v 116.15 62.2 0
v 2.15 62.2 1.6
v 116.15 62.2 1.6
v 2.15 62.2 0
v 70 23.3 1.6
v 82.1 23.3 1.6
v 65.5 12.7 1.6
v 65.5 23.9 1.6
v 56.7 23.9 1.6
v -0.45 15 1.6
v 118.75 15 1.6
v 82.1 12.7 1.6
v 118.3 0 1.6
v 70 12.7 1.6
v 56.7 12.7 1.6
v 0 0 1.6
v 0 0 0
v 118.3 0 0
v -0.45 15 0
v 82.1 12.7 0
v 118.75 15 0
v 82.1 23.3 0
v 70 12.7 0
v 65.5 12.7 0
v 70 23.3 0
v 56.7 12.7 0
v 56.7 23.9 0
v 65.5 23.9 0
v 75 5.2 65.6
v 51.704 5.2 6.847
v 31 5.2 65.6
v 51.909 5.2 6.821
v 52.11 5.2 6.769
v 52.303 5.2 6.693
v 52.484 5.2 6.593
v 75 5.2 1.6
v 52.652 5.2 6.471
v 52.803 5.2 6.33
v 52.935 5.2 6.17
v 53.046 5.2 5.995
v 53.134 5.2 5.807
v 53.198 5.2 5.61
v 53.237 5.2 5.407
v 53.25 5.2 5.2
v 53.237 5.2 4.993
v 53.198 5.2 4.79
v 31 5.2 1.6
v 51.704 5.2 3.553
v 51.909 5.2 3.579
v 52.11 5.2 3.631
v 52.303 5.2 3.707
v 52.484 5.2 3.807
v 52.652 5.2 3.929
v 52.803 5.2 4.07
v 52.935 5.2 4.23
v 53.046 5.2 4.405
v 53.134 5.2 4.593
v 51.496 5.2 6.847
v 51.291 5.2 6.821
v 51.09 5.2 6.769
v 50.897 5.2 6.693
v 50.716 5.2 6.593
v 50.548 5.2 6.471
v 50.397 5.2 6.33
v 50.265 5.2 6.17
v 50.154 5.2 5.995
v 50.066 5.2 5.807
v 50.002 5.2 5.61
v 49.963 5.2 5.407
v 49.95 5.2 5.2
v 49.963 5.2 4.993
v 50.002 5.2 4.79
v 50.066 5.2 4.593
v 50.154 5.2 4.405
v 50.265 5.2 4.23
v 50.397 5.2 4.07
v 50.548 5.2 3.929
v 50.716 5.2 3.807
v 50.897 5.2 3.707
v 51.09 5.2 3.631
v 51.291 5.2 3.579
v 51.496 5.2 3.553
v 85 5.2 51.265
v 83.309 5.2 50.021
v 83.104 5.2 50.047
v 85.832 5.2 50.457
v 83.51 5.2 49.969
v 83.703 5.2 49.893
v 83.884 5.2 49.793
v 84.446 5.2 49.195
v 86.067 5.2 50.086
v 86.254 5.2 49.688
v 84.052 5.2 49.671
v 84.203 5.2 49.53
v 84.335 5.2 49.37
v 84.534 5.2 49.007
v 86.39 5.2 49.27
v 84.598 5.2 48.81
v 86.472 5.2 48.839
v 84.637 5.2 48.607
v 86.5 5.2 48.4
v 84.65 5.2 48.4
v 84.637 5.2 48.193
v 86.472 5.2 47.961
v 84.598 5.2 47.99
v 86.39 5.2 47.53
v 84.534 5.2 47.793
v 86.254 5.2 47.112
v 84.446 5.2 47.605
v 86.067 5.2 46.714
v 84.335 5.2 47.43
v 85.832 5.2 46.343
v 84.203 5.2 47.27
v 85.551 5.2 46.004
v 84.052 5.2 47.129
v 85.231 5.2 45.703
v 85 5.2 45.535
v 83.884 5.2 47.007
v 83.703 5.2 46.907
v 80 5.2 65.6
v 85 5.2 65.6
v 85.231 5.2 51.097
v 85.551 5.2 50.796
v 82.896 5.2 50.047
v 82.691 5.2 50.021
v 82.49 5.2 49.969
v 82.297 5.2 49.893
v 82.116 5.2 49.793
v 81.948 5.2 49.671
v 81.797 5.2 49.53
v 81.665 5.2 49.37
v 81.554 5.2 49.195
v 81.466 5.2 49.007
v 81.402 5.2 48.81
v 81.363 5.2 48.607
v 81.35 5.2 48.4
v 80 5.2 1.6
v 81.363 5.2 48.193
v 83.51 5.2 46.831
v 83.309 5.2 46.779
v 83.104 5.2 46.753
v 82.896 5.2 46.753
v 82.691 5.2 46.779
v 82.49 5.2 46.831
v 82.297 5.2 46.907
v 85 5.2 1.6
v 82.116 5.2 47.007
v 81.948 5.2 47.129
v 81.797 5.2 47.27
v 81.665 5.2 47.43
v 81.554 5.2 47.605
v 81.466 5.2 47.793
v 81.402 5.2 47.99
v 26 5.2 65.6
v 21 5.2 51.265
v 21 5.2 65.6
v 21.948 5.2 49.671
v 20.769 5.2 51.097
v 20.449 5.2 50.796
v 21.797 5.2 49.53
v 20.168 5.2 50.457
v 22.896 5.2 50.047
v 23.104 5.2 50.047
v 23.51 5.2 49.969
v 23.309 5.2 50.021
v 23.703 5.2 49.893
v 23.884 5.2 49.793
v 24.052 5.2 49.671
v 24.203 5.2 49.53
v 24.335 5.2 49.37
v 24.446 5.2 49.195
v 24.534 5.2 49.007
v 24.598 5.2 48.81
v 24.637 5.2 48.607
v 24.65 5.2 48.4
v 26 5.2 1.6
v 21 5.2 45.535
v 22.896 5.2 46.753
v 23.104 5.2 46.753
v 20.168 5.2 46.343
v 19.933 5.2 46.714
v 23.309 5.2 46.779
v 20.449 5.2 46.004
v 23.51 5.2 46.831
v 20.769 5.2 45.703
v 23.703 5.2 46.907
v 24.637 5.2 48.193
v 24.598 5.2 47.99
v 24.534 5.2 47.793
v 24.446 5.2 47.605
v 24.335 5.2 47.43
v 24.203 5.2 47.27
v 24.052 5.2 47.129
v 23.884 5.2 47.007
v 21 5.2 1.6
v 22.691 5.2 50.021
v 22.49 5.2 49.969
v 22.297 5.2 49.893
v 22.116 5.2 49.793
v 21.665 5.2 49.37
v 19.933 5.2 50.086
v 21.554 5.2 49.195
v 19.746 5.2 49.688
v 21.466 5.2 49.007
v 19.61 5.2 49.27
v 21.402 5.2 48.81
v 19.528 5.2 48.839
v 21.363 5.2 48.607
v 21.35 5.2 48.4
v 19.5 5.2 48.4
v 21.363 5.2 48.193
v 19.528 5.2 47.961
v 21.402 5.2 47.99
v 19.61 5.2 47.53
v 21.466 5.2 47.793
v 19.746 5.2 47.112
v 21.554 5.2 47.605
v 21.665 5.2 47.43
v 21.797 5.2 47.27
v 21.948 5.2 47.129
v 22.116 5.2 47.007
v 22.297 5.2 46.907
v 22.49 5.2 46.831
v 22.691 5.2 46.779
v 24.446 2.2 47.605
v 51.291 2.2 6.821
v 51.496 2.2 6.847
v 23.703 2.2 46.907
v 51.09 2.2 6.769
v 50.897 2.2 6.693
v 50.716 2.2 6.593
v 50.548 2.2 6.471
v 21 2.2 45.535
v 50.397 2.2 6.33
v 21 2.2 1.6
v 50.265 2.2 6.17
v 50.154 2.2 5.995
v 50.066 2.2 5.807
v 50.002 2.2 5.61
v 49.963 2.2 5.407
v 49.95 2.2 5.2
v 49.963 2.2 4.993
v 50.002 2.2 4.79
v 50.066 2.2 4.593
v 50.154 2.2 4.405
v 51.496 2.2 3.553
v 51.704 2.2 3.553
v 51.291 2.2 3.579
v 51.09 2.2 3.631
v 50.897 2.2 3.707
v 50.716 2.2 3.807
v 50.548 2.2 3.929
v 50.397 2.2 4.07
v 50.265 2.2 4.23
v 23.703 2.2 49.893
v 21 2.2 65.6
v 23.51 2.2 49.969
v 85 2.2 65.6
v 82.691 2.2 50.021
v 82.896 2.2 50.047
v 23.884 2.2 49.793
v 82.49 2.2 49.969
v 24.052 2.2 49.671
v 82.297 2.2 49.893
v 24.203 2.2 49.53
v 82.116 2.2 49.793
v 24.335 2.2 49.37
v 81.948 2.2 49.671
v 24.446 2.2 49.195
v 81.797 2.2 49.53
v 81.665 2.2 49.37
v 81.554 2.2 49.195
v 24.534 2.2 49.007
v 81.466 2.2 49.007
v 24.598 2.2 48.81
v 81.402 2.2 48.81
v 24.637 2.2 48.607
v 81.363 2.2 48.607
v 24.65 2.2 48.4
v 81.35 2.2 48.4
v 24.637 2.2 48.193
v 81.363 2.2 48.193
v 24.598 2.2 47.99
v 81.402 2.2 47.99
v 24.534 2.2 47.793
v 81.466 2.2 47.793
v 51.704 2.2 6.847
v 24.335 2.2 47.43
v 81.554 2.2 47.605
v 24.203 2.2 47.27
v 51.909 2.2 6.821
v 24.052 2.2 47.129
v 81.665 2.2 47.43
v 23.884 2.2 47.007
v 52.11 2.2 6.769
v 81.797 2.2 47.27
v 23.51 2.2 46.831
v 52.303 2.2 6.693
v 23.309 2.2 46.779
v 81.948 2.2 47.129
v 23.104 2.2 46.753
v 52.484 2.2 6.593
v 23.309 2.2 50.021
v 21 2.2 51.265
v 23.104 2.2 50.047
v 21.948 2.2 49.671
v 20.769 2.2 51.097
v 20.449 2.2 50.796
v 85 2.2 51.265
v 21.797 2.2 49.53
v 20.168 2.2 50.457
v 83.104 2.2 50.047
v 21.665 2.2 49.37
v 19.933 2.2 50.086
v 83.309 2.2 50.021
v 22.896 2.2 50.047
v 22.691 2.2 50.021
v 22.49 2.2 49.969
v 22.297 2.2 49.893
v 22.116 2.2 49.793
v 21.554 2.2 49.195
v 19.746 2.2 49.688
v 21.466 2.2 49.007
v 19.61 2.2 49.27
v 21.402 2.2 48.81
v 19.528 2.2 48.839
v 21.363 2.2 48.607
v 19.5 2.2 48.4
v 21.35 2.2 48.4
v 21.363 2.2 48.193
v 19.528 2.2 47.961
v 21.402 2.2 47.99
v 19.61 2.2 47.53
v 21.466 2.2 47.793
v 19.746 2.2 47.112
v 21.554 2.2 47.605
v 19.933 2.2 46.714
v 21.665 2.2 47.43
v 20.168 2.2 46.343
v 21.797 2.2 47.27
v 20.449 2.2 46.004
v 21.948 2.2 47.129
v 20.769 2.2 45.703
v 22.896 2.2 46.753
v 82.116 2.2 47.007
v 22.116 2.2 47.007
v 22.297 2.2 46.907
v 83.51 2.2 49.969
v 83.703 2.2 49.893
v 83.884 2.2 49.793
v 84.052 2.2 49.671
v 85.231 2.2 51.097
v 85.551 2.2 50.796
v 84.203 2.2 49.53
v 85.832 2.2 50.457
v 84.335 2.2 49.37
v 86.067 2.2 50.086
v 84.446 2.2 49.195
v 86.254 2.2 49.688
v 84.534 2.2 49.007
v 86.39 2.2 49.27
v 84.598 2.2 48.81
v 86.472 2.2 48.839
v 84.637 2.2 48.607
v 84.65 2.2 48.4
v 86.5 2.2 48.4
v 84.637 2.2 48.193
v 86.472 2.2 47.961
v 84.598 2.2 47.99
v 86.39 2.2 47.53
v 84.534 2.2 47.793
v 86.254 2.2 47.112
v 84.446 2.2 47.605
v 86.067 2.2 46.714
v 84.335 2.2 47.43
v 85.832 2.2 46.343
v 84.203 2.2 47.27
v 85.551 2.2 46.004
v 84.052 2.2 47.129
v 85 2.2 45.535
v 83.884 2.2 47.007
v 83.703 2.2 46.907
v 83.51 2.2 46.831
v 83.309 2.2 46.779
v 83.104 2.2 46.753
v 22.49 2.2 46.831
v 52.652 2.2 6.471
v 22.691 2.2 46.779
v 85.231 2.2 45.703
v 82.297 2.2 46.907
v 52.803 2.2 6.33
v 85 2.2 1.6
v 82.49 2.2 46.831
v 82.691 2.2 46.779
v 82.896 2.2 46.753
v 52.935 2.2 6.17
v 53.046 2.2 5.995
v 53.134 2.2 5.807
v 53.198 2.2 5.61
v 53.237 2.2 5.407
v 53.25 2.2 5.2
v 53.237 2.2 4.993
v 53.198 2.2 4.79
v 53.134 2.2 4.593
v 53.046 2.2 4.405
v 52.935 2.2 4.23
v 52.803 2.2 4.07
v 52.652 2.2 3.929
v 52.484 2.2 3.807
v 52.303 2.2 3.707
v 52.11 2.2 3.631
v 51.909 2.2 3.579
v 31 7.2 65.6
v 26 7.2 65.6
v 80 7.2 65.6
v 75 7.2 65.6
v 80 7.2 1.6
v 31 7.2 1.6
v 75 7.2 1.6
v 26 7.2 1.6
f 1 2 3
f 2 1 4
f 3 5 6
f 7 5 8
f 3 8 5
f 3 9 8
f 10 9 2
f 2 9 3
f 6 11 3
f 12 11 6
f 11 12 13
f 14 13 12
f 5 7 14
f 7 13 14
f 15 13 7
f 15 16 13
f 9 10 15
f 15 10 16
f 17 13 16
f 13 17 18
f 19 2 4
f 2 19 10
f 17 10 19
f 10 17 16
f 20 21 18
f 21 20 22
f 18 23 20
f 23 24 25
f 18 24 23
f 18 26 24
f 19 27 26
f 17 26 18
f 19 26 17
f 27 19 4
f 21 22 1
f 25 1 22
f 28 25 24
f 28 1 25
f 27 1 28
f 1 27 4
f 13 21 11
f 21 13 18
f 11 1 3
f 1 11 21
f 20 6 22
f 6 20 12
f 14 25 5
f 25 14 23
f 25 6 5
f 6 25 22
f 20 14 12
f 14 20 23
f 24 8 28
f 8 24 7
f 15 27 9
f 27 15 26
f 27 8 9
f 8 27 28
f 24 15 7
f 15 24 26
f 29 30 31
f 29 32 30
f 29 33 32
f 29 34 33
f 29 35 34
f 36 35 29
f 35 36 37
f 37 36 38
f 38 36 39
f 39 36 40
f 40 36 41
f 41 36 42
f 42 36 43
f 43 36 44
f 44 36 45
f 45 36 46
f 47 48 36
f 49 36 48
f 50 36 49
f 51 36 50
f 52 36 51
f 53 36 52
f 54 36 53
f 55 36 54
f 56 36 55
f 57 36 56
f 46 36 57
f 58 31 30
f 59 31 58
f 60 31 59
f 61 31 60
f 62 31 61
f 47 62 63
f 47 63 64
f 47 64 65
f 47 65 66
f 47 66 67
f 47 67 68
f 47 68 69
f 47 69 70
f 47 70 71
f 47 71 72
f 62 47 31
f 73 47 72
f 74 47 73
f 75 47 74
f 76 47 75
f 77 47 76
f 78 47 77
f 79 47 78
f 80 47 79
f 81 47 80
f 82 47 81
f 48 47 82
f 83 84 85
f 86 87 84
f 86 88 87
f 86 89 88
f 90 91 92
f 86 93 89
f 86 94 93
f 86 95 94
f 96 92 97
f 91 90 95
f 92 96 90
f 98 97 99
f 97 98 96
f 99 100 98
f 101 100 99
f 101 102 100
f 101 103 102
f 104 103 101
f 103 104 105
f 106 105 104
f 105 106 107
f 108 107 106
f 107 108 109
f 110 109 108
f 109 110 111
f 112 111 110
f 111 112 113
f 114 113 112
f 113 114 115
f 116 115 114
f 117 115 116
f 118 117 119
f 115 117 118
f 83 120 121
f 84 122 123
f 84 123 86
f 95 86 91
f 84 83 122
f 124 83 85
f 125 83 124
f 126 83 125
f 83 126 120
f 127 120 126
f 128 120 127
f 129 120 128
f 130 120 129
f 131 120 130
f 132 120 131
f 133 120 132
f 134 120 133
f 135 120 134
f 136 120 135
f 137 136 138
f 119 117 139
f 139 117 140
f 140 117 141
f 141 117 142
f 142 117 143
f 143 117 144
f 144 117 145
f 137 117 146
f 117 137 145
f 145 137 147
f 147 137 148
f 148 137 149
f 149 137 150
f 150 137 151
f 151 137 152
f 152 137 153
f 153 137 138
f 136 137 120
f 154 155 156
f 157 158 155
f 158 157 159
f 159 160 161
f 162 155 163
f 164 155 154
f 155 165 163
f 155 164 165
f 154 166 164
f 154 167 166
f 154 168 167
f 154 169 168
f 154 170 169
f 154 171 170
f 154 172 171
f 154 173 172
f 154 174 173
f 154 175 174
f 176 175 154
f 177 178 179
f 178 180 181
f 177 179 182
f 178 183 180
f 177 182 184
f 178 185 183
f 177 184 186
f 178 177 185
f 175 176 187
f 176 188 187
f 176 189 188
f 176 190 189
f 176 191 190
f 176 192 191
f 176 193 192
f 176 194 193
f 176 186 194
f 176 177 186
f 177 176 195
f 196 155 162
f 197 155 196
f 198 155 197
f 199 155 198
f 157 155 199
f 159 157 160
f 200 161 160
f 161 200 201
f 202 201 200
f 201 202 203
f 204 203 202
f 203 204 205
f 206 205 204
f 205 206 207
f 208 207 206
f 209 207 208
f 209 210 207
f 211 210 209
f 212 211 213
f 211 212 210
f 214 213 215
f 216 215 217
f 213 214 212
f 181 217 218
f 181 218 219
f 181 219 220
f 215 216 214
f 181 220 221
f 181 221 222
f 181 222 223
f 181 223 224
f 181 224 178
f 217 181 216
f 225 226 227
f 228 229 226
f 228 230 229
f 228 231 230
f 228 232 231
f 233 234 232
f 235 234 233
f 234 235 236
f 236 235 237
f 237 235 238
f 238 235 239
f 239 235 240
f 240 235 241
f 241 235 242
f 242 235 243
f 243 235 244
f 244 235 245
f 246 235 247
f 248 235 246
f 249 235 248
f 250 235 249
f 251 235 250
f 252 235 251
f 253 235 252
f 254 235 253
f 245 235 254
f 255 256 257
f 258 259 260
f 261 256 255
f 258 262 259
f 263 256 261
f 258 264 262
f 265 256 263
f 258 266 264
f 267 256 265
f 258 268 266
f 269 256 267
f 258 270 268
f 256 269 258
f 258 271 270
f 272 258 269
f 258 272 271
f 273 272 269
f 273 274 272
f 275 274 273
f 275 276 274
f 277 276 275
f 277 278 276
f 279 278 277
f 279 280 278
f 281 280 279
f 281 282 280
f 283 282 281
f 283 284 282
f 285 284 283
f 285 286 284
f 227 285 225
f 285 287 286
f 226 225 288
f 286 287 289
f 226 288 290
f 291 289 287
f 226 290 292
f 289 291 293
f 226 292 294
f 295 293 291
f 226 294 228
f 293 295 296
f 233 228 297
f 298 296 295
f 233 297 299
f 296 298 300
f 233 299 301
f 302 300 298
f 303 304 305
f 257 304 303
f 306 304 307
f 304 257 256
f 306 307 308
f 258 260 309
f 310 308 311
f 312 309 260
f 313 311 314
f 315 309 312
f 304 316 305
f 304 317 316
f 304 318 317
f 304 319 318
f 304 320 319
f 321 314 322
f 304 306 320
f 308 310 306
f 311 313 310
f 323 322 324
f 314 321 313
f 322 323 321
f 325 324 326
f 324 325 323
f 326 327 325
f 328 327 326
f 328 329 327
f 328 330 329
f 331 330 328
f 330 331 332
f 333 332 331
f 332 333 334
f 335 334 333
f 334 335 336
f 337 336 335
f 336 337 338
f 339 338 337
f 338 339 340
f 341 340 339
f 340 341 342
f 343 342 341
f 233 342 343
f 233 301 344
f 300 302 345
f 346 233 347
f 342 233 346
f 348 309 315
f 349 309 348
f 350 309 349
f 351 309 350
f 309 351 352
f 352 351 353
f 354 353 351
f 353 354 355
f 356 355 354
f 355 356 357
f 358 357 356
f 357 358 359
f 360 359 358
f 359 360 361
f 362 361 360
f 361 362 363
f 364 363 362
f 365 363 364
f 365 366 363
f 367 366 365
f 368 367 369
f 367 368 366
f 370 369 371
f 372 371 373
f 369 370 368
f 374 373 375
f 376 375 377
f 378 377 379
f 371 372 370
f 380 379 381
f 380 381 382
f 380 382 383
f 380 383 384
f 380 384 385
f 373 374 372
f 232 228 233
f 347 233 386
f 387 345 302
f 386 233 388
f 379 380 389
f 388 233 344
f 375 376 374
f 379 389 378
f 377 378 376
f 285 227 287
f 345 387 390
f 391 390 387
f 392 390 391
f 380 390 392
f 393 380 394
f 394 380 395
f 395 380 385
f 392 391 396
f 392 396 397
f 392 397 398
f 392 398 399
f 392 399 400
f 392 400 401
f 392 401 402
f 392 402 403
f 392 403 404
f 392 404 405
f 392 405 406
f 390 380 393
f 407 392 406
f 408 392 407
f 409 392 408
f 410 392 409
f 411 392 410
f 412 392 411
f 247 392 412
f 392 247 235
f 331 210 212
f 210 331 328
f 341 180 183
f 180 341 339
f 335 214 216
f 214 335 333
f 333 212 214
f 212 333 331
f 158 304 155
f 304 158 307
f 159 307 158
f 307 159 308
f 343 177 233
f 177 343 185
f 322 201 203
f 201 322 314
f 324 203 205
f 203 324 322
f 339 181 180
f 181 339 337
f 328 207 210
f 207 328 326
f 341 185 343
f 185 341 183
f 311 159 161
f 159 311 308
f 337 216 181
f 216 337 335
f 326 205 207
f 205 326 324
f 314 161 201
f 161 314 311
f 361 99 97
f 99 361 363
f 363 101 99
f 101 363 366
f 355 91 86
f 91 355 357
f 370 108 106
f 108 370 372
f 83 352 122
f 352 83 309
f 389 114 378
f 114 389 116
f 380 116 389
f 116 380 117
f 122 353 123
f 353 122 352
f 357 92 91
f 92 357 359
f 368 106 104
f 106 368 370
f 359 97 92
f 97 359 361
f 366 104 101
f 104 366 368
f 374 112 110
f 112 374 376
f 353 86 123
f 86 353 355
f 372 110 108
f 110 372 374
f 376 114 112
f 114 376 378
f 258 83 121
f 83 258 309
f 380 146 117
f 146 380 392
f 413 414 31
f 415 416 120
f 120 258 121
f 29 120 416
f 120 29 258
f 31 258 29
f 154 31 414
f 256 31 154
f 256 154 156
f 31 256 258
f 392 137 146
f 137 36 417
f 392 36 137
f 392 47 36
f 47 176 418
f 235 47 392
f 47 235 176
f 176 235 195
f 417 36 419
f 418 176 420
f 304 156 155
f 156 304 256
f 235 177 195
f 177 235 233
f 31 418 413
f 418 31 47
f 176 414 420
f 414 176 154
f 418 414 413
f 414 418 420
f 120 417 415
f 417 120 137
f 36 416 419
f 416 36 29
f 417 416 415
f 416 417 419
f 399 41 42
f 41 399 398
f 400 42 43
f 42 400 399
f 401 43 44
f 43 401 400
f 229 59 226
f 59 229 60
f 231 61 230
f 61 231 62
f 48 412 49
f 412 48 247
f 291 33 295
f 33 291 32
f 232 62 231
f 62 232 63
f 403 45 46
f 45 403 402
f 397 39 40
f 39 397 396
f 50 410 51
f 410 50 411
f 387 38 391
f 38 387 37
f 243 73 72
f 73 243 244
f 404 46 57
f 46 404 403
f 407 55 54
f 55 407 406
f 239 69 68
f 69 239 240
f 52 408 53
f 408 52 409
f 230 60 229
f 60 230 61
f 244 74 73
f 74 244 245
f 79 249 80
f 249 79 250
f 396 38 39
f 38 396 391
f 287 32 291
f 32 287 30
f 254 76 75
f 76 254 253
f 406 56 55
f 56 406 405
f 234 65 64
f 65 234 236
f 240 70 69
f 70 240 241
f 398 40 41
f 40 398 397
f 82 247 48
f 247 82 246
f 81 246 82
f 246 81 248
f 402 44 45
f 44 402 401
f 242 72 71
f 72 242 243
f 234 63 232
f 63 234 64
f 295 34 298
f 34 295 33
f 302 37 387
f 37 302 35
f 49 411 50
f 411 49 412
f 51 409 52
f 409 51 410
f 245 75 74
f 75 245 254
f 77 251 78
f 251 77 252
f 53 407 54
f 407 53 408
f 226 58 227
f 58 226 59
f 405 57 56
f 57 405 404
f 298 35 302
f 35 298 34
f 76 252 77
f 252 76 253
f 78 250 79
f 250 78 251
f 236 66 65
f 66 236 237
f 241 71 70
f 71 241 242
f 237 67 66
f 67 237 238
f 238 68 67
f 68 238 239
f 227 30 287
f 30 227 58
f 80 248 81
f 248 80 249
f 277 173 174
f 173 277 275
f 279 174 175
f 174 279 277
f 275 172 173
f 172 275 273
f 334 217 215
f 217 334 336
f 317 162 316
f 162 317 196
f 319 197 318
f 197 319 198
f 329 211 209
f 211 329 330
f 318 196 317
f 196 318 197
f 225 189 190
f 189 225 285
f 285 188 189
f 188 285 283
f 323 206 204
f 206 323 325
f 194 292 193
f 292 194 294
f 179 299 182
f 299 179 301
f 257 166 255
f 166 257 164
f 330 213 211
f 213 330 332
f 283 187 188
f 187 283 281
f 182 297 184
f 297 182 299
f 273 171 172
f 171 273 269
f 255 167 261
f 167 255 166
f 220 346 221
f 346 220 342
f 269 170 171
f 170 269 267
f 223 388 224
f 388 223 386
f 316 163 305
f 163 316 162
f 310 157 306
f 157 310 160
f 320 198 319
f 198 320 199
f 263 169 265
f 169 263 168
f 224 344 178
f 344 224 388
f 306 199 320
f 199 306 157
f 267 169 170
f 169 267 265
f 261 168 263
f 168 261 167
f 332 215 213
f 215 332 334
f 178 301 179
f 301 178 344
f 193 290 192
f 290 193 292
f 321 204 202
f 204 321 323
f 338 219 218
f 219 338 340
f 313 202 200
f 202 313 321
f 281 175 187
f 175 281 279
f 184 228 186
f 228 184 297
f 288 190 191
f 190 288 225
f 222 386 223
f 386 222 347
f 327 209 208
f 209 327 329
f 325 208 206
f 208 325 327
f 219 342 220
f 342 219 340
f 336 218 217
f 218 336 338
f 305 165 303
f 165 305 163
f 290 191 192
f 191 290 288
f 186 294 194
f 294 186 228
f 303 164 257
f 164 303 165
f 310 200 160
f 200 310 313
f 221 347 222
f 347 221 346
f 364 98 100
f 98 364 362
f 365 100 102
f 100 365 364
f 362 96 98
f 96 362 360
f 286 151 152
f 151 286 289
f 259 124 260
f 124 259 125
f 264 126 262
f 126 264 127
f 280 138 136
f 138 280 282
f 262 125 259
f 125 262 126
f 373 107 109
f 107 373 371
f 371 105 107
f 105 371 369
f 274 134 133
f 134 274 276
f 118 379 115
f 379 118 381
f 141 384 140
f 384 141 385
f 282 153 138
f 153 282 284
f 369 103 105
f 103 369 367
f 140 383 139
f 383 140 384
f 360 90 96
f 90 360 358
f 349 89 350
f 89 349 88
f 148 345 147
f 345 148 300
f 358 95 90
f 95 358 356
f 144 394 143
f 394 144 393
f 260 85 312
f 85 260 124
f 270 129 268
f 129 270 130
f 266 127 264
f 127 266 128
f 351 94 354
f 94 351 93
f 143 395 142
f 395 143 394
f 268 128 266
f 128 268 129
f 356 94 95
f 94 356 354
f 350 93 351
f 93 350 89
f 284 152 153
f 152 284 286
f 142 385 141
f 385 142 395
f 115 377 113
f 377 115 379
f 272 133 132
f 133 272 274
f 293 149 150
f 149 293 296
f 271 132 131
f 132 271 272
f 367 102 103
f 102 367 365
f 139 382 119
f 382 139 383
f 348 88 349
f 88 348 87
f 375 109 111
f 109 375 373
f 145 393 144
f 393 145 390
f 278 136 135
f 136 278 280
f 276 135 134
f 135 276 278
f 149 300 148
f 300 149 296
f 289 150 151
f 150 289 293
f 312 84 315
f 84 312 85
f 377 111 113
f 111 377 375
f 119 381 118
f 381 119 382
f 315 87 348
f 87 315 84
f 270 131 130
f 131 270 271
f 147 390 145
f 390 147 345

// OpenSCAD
//
// OpenSCAD file describing a back plate replacement for 3" Oric Microdisc drive units, includes:
// - PCB holder with three holes designed to host a GreaseWeazle F7 Lightning Plus
// - Holes on the back plate, one for the USB connector and one for the 12v power
//
thickness = 1.6;        // Total thickness of the back plate (mm)
height = 62.2;          // Height of the back plate (mm)
bottom_width = 118.3;   // Width at the bottom (mm)
mid_width = 119.2;      // Width at 15mm height (mm)
top_width = 114;        // Width at the top (mm)
mid_height = 15.0;      // Height of the widest section (mm)

// PCB support frame parameters
frame_offset_y = 2.2;   // Distance from bottom of back plate (mm)
frame_offset_x = 21.0;  // Distance from left side (mm)
frame_width = 64.0;     // Width of the frame along back plate (mm)
frame_depth = 64.0;     // Depth perpendicular to back plate (mm)
frame_thickness = 3.0;  // Thickness of the frame (mm)
ridge_thickness = 2.0;  // Thickness of the ridges on top
ridge_width = 5.0;      // Width of each ridge
ridge_offset_x = 5.0;   // Offset from frame edges for ridge placement
standoff_height = 6.0;  // Height of motherboard screw stands
pcb_thickness = 1.5;    // Thickness of the PCB

// Hole parameters
hole_radius = 3.3 / 2;        // Radius of holes (3.3mm diameter)
bulge_radius = 3.5;           // Radius for bulges (7 mm diameter)
hole1_x = 30.6;               // Center of first hole (30.6 mm from frame's left edge)
hole1_z = thickness + 2.0;    // 2 mm from front edge (back plate inner surface)
hole2_x = 2.0;                // 2 mm from left edge of frame
hole2_z = thickness + 45.2;   // 45.2 mm from front panel
hole3_x = frame_width - 2.0;  // 2 mm from right edge of frame
hole3_z = thickness + 45.2;   // 45.2 mm from front panel

// Connector hole parameters
usb_hole_x = frame_offset_x + 49.0;  // 49 mm from PCB left edge (21.0 + 49.0)
usb_hole_width = 12.1;               // USB connector width (mm)
usb_hole_height = 10.6;              // USB connector height (mm)

power_hole_x = frame_offset_x + 35.7;  // 35.7 mm from PCB left edge (21.0 + 35.7)
power_hole_width = 8.8;                // Power connector width (mm)
power_hole_height = 11.2;              // Power connector height (mm)

hole_y_offset = frame_offset_y + frame_thickness + standoff_height + pcb_thickness; // Start at top of PCB (12.7 mm)

// Back plate with holes for the 12v power and usb connectors
difference() 
{
    // Outer shape
    linear_extrude(height = thickness) 
    polygon(points=[
        [0, 0],                                                      // Bottom-left corner
        [bottom_width, 0],                                           // Bottom-right corner
        [bottom_width + (mid_width - bottom_width) / 2, mid_height], // Mid-right
        [bottom_width - (bottom_width - top_width) / 2, height],     // Top-right
        [(bottom_width - top_width) / 2, height],                    // Top-left
        [(bottom_width - mid_width) / 2, mid_height]                 // Mid-left
    ]);
    
    // Subtract USB connector hole
    translate([usb_hole_x, hole_y_offset, 0]) 
    cube([usb_hole_width, usb_hole_height, thickness]);
    
    // Subtract Power connector hole
    translate([power_hole_x, hole_y_offset, 0]) 
    cube([power_hole_width, power_hole_height, thickness]);
}

// PCB support frame with holes and ridges
translate([frame_offset_x, frame_offset_y, thickness]) 
difference() 
{
    // PCB support frame
    union() 
    {
        cube([frame_width, frame_thickness, frame_depth]);
        add_holes(bulge_radius);

        // Add ridges on top of the PCB support frame
        translate([ridge_offset_x, frame_thickness, 0]) 
        cube([ridge_width, ridge_thickness, frame_depth]);
        
        translate([frame_width - ridge_offset_x - ridge_width, frame_thickness, 0]) 
        cube([ridge_width, ridge_thickness, frame_depth]);        
    }           
    add_holes(hole_radius);            
}


module add_holes(radius)
{
    // Hole 1: Center, 2 mm from front
    translate([hole1_x, frame_thickness, hole1_z]) 
    rotate([90, 0, 0]) 
    cylinder(h = frame_thickness, r = radius, $fn = 50);

    // Hole 2: Left edge, 45.2 mm from front
    translate([hole2_x, frame_thickness, hole2_z]) 
    rotate([90, 0, 0]) 
    cylinder(h = frame_thickness, r = radius, $fn = 50);

    // Hole 3: Right edge, 45.2 mm from front
    translate([hole3_x, frame_thickness, hole3_z]) 
    rotate([90, 0, 0]) 
    cylinder(h = frame_thickness, r = radius, $fn = 50);
}
